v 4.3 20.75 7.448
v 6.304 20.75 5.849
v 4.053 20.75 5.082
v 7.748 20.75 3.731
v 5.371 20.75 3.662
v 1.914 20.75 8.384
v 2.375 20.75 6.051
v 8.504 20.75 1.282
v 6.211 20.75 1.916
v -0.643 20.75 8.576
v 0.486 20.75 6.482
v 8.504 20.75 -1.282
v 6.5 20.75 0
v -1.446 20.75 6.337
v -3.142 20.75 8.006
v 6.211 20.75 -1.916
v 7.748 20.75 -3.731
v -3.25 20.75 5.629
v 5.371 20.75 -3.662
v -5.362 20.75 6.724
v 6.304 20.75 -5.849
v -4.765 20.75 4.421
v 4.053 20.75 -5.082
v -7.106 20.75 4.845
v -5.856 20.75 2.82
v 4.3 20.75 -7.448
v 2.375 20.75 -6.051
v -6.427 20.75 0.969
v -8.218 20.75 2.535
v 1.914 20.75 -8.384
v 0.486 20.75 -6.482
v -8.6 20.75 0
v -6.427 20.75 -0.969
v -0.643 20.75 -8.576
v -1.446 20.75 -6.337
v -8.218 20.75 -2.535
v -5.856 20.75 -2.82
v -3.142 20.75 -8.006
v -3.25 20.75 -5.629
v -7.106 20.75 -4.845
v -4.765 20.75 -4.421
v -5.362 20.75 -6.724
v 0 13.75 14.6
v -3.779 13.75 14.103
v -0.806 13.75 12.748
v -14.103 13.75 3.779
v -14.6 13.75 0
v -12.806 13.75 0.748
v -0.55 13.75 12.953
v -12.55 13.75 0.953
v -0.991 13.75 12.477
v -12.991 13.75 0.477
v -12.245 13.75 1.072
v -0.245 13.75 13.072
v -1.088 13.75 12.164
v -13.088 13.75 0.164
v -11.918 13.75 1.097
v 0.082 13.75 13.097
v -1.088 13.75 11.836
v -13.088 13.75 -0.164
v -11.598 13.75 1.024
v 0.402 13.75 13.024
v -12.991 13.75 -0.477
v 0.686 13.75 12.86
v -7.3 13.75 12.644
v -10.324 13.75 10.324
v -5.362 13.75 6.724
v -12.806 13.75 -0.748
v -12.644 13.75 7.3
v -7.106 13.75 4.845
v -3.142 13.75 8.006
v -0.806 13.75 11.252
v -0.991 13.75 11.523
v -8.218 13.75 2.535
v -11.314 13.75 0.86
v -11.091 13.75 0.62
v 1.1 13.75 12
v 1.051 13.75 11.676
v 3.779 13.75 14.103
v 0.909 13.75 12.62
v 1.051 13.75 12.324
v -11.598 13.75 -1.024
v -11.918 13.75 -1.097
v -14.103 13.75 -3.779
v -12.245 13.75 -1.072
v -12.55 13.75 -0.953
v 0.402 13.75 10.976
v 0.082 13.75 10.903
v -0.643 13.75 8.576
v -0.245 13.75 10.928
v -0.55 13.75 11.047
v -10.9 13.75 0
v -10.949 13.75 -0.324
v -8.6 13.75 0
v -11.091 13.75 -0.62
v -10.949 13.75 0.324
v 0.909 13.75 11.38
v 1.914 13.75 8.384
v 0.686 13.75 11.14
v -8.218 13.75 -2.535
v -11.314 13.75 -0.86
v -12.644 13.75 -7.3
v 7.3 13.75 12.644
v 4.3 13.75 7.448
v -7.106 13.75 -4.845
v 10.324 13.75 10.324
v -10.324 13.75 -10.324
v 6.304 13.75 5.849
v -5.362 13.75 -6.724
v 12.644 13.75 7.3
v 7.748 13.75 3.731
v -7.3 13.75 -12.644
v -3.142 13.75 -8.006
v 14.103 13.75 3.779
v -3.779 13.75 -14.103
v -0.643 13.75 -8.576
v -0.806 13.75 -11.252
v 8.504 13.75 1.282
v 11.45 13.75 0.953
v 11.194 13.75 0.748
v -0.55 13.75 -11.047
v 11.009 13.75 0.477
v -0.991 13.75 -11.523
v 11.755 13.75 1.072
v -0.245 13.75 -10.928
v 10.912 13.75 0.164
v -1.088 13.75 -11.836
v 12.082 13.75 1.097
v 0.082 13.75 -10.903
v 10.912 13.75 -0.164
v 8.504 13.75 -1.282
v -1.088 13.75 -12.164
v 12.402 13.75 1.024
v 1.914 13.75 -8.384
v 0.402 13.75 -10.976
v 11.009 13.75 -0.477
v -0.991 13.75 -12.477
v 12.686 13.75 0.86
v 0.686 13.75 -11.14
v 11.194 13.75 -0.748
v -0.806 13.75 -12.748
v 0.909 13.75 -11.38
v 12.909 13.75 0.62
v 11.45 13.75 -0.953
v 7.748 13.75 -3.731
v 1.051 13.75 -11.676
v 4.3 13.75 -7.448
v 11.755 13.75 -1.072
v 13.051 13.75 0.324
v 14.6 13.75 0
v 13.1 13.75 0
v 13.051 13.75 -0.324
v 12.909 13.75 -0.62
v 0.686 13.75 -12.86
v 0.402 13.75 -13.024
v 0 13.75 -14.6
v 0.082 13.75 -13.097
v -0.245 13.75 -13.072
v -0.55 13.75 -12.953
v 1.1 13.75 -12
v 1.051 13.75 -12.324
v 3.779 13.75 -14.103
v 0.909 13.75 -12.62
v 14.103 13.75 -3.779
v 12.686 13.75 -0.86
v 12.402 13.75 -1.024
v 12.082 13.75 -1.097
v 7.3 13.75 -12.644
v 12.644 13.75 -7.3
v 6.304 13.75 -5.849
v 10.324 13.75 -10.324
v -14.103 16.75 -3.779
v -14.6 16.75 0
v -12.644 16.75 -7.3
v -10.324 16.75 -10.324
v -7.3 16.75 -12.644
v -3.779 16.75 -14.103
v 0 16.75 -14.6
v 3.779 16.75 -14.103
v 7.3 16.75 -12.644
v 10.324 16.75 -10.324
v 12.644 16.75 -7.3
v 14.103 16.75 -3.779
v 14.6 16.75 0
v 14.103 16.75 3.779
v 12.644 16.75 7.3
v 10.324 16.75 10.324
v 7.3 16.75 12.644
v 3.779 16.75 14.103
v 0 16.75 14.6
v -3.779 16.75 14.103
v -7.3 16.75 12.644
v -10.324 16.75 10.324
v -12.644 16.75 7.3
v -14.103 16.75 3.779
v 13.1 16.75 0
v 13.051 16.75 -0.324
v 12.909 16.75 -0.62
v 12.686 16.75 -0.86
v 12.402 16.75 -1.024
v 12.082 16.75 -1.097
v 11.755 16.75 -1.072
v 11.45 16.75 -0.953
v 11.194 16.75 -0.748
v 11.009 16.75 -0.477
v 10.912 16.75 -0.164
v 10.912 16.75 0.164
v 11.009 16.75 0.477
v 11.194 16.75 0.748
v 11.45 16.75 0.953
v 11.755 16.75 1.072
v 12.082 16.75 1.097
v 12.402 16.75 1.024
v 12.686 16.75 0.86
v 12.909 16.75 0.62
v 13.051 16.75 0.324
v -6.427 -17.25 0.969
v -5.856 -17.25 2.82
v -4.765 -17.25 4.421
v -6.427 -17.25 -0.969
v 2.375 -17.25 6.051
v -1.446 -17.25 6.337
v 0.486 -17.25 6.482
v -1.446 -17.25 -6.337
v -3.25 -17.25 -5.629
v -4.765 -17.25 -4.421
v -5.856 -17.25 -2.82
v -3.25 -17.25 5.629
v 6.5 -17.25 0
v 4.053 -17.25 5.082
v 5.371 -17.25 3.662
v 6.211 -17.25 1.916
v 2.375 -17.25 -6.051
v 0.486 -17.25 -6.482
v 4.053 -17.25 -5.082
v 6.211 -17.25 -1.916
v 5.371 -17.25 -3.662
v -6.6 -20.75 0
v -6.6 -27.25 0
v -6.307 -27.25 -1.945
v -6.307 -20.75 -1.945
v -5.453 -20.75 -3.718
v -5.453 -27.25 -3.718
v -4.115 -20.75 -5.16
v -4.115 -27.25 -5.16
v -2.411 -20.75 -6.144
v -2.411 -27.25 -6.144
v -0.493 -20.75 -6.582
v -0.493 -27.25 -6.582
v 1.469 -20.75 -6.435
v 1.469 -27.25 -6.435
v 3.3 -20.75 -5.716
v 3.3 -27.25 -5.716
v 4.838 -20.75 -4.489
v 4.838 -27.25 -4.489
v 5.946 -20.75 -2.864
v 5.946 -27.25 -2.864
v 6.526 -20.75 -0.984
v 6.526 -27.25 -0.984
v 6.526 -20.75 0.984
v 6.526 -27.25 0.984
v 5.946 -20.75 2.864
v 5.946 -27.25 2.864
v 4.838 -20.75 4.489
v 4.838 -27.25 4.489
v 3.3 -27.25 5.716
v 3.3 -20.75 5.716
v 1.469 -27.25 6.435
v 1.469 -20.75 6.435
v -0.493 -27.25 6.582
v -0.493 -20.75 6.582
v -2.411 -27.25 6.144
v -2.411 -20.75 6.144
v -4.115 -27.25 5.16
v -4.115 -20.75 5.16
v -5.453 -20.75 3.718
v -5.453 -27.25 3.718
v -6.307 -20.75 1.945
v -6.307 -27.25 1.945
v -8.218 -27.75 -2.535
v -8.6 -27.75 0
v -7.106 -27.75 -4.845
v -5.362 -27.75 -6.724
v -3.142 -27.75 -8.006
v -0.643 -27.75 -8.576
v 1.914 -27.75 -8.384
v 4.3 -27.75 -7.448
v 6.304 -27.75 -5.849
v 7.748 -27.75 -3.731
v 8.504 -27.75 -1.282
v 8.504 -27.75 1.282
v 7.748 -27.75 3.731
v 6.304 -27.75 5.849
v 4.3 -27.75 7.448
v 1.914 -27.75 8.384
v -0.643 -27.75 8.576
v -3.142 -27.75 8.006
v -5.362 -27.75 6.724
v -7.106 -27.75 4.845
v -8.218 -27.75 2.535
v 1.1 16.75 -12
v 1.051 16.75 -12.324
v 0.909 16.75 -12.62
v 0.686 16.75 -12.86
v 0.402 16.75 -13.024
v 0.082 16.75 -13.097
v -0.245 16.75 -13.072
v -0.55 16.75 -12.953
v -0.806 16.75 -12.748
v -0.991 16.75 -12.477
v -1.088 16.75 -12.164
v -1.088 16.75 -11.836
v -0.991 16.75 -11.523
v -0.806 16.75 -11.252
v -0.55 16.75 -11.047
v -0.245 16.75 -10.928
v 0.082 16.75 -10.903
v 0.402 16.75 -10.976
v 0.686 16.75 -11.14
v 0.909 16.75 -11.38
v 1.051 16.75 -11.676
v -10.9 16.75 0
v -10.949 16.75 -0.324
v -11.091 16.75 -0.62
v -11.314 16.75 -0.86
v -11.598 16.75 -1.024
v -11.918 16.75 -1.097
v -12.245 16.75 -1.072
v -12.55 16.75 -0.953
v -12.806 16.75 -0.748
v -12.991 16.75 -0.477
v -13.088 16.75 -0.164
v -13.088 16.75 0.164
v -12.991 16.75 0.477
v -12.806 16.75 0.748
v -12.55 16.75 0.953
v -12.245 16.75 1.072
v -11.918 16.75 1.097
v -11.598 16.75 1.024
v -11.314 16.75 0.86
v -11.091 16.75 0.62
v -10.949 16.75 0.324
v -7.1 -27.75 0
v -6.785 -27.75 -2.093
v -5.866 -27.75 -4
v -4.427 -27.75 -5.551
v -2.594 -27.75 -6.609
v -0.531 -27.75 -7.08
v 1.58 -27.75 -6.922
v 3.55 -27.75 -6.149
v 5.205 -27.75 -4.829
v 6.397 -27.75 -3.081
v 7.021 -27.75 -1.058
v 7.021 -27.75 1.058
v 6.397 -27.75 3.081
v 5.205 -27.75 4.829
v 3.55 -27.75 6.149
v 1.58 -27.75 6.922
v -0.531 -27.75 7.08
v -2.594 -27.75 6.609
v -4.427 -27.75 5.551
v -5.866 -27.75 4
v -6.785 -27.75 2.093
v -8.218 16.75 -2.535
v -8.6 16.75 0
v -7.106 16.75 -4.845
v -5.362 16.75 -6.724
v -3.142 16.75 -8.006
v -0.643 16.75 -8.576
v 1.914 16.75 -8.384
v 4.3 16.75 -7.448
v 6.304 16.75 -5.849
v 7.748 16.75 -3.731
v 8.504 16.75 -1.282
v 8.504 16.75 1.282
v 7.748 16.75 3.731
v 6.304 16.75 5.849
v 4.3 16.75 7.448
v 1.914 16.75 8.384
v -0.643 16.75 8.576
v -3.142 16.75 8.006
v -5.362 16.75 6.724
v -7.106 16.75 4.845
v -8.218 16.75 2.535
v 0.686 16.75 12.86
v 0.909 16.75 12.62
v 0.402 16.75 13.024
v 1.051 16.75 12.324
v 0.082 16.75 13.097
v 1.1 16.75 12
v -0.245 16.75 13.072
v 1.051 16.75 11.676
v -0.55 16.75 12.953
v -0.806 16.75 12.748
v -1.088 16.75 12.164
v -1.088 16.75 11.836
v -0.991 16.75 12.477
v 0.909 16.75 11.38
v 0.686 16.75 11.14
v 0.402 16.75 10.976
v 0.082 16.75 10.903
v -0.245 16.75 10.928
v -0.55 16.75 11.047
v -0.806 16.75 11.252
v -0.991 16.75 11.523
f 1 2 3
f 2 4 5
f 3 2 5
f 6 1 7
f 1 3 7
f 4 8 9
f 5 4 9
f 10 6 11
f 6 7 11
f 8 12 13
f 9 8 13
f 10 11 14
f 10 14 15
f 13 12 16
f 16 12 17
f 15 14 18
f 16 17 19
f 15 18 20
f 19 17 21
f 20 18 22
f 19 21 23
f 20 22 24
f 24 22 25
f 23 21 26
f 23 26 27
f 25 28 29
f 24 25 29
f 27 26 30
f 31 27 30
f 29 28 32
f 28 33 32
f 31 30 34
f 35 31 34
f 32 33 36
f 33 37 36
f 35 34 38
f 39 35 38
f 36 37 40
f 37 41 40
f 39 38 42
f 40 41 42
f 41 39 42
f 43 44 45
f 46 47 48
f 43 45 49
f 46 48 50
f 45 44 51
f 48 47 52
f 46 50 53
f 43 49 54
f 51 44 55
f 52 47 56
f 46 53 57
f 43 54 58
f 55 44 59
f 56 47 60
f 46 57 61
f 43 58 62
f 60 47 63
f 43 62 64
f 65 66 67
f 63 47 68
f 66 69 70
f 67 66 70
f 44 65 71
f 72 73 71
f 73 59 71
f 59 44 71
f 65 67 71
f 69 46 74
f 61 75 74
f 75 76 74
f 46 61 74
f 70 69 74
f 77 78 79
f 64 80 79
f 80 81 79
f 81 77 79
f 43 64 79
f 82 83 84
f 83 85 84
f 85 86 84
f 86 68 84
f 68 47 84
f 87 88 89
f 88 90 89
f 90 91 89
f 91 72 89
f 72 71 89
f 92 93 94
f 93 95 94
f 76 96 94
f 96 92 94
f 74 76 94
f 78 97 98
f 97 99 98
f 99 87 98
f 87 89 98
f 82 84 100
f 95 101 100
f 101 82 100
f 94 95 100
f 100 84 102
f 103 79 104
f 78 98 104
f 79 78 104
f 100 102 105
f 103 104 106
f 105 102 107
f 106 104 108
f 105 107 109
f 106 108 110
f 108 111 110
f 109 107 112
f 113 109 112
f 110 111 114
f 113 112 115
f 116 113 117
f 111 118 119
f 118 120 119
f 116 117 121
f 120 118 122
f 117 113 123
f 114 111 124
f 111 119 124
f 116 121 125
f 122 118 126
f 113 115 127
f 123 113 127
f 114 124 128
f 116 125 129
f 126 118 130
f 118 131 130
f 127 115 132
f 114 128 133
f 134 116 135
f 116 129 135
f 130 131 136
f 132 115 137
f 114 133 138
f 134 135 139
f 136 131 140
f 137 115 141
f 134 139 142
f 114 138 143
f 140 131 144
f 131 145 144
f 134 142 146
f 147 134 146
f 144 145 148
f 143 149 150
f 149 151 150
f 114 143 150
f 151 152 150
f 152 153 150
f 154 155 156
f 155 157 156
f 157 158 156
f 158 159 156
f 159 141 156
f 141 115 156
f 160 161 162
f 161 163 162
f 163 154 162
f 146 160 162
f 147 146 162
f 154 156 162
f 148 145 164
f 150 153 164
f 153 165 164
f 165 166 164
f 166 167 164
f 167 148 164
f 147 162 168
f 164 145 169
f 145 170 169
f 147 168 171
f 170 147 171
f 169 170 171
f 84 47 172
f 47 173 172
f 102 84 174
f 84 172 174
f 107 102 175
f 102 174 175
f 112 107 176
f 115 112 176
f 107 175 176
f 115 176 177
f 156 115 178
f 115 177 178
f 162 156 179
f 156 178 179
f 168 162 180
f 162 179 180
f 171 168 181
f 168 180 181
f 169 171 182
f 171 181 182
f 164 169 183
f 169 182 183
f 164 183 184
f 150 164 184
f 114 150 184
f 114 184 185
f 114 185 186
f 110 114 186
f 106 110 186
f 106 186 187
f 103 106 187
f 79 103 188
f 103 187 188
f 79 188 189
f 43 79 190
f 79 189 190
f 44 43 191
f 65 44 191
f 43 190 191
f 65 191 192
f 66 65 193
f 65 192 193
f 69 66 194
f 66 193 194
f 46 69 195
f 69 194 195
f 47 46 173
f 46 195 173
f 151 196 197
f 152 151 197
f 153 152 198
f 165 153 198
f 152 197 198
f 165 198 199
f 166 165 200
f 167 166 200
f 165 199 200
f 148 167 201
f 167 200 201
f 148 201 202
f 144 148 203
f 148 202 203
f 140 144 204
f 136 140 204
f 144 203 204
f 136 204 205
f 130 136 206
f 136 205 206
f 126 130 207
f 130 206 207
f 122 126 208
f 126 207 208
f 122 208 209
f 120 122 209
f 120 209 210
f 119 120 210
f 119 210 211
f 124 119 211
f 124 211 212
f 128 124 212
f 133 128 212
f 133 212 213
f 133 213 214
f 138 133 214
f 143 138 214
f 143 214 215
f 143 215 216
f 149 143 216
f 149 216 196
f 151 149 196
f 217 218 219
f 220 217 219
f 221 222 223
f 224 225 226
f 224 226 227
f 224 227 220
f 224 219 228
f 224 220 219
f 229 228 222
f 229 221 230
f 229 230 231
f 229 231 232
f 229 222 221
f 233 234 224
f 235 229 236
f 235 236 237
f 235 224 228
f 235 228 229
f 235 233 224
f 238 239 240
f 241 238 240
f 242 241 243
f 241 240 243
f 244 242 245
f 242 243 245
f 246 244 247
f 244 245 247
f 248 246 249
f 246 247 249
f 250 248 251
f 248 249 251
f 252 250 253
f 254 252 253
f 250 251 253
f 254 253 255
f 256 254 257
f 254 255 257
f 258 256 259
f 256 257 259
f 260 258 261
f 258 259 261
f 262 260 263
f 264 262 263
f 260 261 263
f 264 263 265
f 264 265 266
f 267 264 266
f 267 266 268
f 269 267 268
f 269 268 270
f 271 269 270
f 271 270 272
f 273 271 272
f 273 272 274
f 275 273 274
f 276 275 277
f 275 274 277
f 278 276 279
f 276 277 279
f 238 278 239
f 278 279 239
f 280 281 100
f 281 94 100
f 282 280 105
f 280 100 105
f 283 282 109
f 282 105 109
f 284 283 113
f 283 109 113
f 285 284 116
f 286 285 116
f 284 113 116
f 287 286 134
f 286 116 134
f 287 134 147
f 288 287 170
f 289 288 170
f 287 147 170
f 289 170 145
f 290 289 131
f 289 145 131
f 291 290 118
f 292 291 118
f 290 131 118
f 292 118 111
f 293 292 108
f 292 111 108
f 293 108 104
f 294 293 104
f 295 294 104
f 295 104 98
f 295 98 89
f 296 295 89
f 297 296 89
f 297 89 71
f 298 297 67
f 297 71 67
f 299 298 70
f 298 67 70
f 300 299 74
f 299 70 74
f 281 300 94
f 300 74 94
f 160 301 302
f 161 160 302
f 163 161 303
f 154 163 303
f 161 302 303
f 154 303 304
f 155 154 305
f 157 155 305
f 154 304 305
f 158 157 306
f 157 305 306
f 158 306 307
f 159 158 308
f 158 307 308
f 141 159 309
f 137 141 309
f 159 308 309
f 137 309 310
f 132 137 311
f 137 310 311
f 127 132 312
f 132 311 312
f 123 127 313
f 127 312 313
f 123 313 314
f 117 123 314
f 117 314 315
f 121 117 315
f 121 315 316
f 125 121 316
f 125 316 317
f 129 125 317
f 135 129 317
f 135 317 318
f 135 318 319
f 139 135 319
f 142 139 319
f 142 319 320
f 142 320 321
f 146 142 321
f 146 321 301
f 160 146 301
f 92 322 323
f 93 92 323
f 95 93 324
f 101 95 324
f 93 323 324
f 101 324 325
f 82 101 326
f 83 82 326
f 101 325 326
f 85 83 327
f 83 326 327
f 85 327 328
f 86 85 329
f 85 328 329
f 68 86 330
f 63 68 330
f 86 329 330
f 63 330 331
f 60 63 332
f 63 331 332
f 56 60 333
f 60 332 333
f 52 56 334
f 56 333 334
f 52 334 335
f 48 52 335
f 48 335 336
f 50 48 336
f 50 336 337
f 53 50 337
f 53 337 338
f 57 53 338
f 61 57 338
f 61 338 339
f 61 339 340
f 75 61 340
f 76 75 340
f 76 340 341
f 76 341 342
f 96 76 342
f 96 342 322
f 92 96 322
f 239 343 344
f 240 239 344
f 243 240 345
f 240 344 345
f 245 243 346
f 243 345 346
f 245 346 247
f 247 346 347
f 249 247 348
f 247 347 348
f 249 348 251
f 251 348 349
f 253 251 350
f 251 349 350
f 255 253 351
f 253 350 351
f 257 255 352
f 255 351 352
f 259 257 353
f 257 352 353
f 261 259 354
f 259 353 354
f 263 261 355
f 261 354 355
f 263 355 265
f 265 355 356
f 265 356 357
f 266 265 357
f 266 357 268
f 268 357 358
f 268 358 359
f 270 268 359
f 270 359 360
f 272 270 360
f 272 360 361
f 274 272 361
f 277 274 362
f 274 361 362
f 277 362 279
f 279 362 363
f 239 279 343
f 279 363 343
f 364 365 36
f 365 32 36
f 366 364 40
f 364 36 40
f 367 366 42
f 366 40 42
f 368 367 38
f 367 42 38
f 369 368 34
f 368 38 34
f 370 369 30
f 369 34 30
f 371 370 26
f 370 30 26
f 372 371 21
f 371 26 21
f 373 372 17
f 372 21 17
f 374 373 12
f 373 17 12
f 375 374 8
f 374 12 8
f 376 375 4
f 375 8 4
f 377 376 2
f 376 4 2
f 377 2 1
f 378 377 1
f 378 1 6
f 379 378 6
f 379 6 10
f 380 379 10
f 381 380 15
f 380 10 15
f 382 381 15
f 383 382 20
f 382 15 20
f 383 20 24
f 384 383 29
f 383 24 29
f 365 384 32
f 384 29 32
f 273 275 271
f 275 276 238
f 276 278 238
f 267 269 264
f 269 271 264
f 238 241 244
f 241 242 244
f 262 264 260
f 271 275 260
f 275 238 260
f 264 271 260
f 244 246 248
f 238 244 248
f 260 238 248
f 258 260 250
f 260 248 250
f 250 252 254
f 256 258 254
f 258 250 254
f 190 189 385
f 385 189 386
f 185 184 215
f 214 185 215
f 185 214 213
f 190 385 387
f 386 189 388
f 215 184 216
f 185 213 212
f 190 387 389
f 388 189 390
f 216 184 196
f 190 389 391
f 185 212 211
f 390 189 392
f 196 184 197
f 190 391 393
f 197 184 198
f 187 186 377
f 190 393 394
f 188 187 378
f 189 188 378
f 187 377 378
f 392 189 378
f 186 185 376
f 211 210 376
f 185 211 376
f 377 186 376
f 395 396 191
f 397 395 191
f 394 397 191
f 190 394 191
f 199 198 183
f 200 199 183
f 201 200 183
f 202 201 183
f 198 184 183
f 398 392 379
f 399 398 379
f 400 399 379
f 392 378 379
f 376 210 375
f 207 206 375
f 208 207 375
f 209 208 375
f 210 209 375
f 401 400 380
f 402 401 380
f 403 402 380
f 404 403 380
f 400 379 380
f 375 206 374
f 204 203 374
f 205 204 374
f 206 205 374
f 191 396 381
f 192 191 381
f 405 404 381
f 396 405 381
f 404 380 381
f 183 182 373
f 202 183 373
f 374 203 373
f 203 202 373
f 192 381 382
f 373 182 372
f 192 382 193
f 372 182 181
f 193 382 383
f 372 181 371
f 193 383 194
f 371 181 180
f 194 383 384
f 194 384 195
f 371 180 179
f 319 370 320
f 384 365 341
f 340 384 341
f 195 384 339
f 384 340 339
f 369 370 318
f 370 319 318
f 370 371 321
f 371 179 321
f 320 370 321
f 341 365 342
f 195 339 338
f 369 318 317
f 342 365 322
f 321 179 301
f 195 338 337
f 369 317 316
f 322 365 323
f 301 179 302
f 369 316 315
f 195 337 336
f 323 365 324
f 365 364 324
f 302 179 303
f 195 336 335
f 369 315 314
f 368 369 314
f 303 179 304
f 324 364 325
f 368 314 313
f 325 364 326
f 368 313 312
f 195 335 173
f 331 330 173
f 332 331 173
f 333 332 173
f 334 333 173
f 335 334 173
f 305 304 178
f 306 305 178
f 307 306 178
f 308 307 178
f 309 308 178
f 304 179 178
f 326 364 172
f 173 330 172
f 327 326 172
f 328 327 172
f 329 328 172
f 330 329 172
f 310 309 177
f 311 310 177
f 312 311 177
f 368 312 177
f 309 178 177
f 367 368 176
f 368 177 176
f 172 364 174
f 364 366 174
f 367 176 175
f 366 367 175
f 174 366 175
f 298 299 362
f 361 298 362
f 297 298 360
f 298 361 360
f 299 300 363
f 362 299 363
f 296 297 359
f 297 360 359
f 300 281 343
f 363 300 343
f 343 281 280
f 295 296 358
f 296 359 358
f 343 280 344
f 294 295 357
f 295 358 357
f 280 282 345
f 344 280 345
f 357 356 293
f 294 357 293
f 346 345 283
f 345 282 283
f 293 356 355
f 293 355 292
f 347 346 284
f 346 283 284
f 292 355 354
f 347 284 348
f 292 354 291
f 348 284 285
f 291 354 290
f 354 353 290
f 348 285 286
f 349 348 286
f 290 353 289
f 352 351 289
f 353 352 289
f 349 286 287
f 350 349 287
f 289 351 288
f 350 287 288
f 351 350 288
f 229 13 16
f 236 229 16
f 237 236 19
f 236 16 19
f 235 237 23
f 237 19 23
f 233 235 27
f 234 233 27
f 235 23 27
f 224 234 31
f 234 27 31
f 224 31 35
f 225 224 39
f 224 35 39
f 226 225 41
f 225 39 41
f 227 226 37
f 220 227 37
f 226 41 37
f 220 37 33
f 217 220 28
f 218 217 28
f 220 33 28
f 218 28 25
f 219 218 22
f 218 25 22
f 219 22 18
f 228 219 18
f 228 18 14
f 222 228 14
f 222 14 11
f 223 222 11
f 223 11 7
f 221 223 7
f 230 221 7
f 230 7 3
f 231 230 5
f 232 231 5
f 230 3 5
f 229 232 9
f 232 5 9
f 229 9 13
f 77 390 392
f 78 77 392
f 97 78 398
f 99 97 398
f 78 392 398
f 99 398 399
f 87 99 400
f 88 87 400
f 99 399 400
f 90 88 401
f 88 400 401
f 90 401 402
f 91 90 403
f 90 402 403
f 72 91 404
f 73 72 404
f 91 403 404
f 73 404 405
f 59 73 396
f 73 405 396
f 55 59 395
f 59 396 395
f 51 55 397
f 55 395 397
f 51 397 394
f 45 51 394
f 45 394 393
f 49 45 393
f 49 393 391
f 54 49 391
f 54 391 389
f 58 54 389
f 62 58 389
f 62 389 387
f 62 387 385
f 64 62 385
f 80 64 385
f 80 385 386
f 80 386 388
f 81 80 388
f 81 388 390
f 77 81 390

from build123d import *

# Parameters (mm, degrees)
CHAMFER1_SIZE      = 0.5
CUT_EXTRUDE1_REACH = 46.5
SKETCH2_R          = 1.1
SKETCH3_R          = 6.5
CUT_EXTRUDE2_DEPTH = 38


with BuildPart() as part:
    # Sketch1 → Revolve1 (revolve)
    with BuildSketch(Plane.XY):
        Polygon((-8.6, 20.75), (0, 20.75), (0, -20.75), (-6.6, -20.75), (-6.6, -27.75), (-8.6, -27.75), (-8.6, 13.75), (-14.6, 13.75), (-14.6, 16.75), (-8.6, 16.75), align=None)
    revolve(axis=Axis((0, 20.75, 0), (0, -1, 0)))

    # Chamfer1
    chamfer1_edges = [part.edges().sort_by_distance(p)[0] for p in [
        (6.6, -27.75, 0),
    ]]
    chamfer(chamfer1_edges, length=CHAMFER1_SIZE)

    # Sketch2 → Cut-Extrude1 (cut, up to next)
    with BuildSketch(Plane(origin=(0, 16.75, 0), x_dir=(1, 0, 0), z_dir=(0, 1, 0)), mode=Mode.PRIVATE) as cut_extrude1_sk1:
        with Locations((0, 12)):
            Circle(SKETCH2_R)
    cut_extrude1_tool1 = extrude(cut_extrude1_sk1.sketch, amount=-CUT_EXTRUDE1_REACH, mode=Mode.PRIVATE) & part.part
    add(cut_extrude1_tool1.solids().sort_by_distance((0, 16.75, -12))[0], mode=Mode.SUBTRACT)
    # Sketch2 → Cut-Extrude1 (cut, up to next)
    with BuildSketch(Plane(origin=(0, 16.75, 0), x_dir=(1, 0, 0), z_dir=(0, 1, 0)), mode=Mode.PRIVATE) as cut_extrude1_sk2:
        with Locations((12, 0)):
            Circle(SKETCH2_R)
    cut_extrude1_tool2 = extrude(cut_extrude1_sk2.sketch, amount=-CUT_EXTRUDE1_REACH, mode=Mode.PRIVATE) & part.part
    add(cut_extrude1_tool2.solids().sort_by_distance((12, 16.75, 0))[0], mode=Mode.SUBTRACT)
    # Sketch2 → Cut-Extrude1 (cut, up to next)
    with BuildSketch(Plane(origin=(0, 16.75, 0), x_dir=(1, 0, 0), z_dir=(0, 1, 0)), mode=Mode.PRIVATE) as cut_extrude1_sk3:
        with Locations((0, -12)):
            Circle(SKETCH2_R)
    cut_extrude1_tool3 = extrude(cut_extrude1_sk3.sketch, amount=-CUT_EXTRUDE1_REACH, mode=Mode.PRIVATE) & part.part
    add(cut_extrude1_tool3.solids().sort_by_distance((0, 16.75, 12))[0], mode=Mode.SUBTRACT)
    # Sketch2 → Cut-Extrude1 (cut, up to next)
    with BuildSketch(Plane(origin=(0, 16.75, 0), x_dir=(1, 0, 0), z_dir=(0, 1, 0)), mode=Mode.PRIVATE) as cut_extrude1_sk4:
        with Locations((-12, 0)):
            Circle(SKETCH2_R)
    cut_extrude1_tool4 = extrude(cut_extrude1_sk4.sketch, amount=-CUT_EXTRUDE1_REACH, mode=Mode.PRIVATE) & part.part
    add(cut_extrude1_tool4.solids().sort_by_distance((-12, 16.75, 0))[0], mode=Mode.SUBTRACT)

    # Sketch3 → Cut-Extrude2 (cut)
    with BuildSketch(Plane(origin=(0, 20.75, 0), x_dir=(1, 0, 0), z_dir=(0, 1, 0))):
        Circle(SKETCH3_R)
    extrude(amount=-CUT_EXTRUDE2_DEPTH, mode=Mode.SUBTRACT)


solid = part.part
